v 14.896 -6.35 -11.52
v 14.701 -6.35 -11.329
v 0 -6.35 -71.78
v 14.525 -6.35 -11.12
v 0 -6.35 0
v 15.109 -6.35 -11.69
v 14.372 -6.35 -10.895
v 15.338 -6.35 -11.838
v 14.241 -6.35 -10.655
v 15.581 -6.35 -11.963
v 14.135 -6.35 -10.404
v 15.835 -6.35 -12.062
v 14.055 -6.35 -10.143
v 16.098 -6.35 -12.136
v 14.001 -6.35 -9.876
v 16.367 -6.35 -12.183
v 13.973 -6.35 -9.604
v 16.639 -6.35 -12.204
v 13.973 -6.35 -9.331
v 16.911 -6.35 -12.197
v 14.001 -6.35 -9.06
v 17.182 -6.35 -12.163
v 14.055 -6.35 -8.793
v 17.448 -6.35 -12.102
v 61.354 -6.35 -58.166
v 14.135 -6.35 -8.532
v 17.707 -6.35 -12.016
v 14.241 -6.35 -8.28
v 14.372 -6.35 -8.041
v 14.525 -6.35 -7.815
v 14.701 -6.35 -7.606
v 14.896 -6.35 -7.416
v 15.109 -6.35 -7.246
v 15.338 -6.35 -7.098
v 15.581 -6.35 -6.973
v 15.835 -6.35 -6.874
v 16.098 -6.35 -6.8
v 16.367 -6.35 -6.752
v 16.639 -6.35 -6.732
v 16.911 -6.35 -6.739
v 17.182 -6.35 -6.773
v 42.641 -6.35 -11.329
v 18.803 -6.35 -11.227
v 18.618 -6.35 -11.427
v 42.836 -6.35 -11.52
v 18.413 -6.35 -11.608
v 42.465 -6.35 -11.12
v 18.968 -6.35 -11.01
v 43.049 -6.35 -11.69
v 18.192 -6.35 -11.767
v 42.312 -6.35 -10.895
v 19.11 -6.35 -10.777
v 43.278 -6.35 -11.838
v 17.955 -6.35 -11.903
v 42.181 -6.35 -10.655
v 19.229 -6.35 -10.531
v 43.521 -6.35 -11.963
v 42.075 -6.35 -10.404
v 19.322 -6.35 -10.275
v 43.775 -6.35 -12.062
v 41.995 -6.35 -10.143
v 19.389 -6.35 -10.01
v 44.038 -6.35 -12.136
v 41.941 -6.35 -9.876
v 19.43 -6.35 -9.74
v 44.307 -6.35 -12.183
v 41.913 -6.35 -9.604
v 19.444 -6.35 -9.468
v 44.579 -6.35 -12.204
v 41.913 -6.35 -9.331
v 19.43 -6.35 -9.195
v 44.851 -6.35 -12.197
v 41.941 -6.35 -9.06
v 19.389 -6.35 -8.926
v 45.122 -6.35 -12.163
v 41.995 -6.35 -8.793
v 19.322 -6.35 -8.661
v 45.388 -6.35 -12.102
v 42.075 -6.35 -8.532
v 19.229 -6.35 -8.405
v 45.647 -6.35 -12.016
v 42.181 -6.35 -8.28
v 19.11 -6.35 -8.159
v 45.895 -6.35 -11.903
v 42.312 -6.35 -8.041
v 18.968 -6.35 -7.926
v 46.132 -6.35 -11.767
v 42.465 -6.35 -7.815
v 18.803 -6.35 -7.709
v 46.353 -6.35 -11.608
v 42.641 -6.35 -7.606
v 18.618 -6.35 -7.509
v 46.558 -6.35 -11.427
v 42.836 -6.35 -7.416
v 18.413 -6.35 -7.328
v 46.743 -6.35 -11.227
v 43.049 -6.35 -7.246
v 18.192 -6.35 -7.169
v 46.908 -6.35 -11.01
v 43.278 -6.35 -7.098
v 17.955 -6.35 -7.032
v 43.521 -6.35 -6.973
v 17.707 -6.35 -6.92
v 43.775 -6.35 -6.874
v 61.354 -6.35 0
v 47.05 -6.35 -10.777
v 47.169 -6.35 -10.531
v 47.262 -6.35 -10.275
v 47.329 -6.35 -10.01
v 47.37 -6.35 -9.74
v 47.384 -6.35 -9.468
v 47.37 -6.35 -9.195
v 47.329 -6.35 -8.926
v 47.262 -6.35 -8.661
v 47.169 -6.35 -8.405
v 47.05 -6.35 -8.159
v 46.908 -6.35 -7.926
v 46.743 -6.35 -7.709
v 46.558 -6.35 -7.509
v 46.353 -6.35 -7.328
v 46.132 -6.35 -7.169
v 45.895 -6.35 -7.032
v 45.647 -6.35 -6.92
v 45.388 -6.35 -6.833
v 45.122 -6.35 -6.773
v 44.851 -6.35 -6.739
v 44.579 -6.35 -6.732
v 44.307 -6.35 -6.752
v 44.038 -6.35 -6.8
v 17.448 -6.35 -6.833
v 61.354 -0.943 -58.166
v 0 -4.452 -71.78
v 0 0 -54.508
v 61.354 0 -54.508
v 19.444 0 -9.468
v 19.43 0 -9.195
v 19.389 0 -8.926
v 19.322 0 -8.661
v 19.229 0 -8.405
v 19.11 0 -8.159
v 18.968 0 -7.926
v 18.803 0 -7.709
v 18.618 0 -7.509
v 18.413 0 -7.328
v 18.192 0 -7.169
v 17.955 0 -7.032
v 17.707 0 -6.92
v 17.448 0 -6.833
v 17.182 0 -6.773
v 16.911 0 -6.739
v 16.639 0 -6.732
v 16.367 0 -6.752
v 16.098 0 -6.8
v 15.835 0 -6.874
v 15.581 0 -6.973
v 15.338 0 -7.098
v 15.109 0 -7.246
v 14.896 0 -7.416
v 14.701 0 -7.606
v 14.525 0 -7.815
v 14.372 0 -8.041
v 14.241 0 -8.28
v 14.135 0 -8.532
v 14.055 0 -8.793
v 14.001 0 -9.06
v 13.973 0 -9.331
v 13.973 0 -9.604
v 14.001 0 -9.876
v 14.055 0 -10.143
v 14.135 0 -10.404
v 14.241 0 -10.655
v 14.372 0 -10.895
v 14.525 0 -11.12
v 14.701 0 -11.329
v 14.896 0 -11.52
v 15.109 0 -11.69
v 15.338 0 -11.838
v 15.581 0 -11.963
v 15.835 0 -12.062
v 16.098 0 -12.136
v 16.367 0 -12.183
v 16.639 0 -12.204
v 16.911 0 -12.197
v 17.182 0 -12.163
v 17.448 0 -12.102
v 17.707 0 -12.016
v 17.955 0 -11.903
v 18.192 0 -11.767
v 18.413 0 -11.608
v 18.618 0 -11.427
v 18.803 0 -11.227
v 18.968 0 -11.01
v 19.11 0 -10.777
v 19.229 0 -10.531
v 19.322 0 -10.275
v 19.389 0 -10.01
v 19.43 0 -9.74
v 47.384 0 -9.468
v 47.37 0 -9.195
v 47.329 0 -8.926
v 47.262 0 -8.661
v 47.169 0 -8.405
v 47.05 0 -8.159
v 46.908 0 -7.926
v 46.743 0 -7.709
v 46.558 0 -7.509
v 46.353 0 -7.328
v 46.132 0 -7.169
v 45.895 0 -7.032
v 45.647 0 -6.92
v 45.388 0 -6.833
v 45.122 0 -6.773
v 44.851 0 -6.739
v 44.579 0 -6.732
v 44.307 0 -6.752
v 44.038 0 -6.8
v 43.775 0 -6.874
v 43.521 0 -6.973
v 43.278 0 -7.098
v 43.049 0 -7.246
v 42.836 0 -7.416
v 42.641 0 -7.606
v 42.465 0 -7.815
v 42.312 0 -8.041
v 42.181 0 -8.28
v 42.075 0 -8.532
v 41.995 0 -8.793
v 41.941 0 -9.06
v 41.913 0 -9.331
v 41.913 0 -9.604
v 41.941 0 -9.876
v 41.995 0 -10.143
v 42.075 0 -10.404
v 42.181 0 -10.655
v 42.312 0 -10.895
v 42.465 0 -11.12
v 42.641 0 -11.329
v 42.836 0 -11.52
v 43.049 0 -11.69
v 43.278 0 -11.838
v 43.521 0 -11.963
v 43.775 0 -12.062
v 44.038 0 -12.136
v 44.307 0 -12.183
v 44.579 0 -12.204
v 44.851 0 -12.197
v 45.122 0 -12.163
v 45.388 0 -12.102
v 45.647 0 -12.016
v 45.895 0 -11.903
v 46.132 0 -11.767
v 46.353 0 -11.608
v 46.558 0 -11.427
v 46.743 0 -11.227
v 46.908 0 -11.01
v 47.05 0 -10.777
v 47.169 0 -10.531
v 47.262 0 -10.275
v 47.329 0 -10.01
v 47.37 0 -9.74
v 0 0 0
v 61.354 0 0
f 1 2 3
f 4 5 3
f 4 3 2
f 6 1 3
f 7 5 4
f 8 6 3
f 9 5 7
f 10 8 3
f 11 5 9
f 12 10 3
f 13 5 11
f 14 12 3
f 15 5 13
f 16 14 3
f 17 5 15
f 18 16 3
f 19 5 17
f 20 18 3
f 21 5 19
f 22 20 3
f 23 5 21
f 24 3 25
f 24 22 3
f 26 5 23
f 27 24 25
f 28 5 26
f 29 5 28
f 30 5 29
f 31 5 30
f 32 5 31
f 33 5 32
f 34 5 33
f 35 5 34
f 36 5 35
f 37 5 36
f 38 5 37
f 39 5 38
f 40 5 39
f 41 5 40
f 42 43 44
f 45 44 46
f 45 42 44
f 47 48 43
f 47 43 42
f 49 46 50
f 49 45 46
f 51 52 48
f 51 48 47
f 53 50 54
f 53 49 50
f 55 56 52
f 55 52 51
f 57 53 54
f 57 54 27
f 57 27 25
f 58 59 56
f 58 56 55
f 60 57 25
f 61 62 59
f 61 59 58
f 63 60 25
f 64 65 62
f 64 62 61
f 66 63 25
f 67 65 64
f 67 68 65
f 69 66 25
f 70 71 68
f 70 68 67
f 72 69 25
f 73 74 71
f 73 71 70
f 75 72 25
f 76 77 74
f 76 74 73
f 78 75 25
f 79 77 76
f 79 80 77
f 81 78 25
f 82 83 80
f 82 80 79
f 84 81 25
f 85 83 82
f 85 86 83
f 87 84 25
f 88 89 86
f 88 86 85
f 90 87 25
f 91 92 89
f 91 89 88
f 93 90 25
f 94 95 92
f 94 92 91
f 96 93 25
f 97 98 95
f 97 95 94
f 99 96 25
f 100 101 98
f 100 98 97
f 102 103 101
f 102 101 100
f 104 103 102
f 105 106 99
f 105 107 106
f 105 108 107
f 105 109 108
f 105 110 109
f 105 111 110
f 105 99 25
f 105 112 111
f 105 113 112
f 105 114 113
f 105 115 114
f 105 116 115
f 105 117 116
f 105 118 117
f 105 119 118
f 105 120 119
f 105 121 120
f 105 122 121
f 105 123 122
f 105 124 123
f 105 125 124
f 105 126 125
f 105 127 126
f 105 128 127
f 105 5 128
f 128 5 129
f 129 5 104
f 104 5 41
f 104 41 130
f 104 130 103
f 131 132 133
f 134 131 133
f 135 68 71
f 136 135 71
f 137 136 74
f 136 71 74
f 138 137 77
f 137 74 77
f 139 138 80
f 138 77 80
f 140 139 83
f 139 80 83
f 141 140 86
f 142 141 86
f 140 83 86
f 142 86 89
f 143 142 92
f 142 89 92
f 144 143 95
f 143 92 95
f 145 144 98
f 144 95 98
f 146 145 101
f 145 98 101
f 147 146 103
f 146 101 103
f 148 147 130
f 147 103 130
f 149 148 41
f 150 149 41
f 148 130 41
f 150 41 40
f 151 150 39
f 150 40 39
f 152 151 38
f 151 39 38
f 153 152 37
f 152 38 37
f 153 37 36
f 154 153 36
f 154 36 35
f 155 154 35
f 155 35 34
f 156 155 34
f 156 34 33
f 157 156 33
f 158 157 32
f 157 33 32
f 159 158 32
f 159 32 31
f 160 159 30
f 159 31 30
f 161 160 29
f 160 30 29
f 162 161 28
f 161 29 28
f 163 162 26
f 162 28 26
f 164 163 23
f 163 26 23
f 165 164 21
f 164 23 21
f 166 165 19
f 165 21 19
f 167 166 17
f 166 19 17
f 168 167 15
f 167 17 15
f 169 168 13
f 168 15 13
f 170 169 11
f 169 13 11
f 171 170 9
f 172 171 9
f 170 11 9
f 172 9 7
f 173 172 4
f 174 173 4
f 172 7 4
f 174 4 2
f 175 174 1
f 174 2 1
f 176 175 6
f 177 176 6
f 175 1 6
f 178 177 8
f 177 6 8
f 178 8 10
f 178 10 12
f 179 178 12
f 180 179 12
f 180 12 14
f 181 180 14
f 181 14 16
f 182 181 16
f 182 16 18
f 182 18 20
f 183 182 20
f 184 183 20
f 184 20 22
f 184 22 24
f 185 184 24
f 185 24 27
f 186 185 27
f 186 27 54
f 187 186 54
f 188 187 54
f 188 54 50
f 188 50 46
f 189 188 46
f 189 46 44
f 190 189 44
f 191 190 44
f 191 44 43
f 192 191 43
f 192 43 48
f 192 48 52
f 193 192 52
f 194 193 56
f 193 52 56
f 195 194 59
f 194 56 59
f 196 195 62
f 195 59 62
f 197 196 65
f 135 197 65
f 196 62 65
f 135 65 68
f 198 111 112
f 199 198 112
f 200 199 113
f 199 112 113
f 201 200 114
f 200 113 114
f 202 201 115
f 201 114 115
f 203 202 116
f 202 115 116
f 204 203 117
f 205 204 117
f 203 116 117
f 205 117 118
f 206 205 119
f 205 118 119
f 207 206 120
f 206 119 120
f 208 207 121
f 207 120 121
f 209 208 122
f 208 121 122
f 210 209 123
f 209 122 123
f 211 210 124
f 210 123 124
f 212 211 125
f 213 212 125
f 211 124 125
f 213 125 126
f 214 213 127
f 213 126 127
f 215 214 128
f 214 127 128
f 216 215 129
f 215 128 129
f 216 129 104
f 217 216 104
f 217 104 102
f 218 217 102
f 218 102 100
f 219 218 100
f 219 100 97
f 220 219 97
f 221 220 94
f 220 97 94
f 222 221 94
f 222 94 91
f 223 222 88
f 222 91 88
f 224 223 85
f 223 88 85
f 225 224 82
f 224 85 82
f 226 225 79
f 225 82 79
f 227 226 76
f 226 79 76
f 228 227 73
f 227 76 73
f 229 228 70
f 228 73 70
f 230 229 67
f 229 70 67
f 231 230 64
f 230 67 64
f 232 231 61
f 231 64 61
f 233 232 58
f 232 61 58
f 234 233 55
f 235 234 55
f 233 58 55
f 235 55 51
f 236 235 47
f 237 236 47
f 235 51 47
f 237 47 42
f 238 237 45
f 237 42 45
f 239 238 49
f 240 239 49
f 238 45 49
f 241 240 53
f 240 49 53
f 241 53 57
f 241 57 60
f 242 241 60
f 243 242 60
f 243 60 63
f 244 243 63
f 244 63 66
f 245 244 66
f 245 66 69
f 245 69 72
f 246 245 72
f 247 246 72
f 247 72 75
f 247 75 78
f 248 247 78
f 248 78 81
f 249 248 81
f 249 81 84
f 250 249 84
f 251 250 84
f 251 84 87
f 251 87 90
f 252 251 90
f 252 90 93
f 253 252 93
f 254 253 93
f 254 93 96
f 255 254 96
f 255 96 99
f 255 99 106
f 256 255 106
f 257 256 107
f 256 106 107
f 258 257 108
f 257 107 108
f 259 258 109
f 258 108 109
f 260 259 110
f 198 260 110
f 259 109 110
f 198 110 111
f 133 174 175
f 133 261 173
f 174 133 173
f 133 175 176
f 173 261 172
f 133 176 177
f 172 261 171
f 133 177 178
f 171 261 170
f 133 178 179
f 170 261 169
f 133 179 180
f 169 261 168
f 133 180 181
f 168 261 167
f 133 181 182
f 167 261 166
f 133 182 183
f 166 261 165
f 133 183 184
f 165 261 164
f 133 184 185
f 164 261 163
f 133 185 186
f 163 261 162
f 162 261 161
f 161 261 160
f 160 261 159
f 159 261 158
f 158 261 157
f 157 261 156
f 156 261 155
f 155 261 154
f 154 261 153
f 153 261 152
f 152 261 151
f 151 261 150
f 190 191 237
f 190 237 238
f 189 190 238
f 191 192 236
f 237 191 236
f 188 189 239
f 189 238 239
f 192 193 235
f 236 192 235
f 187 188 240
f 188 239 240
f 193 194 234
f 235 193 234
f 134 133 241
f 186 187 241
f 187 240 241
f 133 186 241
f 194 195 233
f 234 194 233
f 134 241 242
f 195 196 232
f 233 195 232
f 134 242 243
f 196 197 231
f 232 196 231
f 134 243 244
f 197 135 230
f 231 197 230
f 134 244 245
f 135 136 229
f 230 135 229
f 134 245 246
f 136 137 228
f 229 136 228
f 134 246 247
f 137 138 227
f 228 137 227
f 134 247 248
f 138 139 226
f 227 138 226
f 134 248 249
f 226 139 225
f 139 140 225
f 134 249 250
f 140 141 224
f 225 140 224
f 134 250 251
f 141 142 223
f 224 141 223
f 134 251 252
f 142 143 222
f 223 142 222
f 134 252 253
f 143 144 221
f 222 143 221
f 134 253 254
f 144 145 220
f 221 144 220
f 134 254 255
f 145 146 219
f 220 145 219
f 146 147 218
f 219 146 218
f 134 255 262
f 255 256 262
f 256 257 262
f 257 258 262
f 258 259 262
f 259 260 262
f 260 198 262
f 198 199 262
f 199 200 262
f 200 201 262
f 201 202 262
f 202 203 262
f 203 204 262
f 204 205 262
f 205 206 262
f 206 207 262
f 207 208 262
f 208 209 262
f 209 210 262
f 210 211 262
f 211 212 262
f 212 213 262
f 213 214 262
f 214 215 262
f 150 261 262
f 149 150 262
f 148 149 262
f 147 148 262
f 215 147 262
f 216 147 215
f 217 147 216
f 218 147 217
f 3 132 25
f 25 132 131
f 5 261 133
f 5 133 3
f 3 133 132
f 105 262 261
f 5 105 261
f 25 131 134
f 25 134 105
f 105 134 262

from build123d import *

# Parameters (mm, degrees)
F1_DEPTH = 6.35
F2_R     = 2.73685
F3_DEPTH = 6.35
F5_DEPTH = 63.5


with BuildPart() as f1:
    # F0 (on Front) → F1 (new body)
    with BuildSketch(Plane.XZ):
        Polygon((61.3537, 0), (0, 0), (0, -71.7804), (61.3537, -58.166), align=None)
    extrude(amount=F1_DEPTH)

    # F2 (on face) → F3 (cut)
    with BuildSketch(Plane.XZ.offset(6.35)):
        with Locations((44.64685, -9.46785)):
            Circle(F2_R)
        with Locations((16.70685, -9.46785)):
            Circle(F2_R)
    extrude(amount=-F3_DEPTH, mode=Mode.SUBTRACT)

    # F4 (on face) → F5 (cut)
    with BuildSketch(Plane(origin=(0, 0, 0), x_dir=(0, -1, 0), z_dir=(-1, 0, 0))):
        Polygon((4.45231, -71.7804), (0, -54.5084), (0, -71.7804), align=None)
    extrude(amount=-F5_DEPTH, mode=Mode.SUBTRACT)


solid = f1.part
